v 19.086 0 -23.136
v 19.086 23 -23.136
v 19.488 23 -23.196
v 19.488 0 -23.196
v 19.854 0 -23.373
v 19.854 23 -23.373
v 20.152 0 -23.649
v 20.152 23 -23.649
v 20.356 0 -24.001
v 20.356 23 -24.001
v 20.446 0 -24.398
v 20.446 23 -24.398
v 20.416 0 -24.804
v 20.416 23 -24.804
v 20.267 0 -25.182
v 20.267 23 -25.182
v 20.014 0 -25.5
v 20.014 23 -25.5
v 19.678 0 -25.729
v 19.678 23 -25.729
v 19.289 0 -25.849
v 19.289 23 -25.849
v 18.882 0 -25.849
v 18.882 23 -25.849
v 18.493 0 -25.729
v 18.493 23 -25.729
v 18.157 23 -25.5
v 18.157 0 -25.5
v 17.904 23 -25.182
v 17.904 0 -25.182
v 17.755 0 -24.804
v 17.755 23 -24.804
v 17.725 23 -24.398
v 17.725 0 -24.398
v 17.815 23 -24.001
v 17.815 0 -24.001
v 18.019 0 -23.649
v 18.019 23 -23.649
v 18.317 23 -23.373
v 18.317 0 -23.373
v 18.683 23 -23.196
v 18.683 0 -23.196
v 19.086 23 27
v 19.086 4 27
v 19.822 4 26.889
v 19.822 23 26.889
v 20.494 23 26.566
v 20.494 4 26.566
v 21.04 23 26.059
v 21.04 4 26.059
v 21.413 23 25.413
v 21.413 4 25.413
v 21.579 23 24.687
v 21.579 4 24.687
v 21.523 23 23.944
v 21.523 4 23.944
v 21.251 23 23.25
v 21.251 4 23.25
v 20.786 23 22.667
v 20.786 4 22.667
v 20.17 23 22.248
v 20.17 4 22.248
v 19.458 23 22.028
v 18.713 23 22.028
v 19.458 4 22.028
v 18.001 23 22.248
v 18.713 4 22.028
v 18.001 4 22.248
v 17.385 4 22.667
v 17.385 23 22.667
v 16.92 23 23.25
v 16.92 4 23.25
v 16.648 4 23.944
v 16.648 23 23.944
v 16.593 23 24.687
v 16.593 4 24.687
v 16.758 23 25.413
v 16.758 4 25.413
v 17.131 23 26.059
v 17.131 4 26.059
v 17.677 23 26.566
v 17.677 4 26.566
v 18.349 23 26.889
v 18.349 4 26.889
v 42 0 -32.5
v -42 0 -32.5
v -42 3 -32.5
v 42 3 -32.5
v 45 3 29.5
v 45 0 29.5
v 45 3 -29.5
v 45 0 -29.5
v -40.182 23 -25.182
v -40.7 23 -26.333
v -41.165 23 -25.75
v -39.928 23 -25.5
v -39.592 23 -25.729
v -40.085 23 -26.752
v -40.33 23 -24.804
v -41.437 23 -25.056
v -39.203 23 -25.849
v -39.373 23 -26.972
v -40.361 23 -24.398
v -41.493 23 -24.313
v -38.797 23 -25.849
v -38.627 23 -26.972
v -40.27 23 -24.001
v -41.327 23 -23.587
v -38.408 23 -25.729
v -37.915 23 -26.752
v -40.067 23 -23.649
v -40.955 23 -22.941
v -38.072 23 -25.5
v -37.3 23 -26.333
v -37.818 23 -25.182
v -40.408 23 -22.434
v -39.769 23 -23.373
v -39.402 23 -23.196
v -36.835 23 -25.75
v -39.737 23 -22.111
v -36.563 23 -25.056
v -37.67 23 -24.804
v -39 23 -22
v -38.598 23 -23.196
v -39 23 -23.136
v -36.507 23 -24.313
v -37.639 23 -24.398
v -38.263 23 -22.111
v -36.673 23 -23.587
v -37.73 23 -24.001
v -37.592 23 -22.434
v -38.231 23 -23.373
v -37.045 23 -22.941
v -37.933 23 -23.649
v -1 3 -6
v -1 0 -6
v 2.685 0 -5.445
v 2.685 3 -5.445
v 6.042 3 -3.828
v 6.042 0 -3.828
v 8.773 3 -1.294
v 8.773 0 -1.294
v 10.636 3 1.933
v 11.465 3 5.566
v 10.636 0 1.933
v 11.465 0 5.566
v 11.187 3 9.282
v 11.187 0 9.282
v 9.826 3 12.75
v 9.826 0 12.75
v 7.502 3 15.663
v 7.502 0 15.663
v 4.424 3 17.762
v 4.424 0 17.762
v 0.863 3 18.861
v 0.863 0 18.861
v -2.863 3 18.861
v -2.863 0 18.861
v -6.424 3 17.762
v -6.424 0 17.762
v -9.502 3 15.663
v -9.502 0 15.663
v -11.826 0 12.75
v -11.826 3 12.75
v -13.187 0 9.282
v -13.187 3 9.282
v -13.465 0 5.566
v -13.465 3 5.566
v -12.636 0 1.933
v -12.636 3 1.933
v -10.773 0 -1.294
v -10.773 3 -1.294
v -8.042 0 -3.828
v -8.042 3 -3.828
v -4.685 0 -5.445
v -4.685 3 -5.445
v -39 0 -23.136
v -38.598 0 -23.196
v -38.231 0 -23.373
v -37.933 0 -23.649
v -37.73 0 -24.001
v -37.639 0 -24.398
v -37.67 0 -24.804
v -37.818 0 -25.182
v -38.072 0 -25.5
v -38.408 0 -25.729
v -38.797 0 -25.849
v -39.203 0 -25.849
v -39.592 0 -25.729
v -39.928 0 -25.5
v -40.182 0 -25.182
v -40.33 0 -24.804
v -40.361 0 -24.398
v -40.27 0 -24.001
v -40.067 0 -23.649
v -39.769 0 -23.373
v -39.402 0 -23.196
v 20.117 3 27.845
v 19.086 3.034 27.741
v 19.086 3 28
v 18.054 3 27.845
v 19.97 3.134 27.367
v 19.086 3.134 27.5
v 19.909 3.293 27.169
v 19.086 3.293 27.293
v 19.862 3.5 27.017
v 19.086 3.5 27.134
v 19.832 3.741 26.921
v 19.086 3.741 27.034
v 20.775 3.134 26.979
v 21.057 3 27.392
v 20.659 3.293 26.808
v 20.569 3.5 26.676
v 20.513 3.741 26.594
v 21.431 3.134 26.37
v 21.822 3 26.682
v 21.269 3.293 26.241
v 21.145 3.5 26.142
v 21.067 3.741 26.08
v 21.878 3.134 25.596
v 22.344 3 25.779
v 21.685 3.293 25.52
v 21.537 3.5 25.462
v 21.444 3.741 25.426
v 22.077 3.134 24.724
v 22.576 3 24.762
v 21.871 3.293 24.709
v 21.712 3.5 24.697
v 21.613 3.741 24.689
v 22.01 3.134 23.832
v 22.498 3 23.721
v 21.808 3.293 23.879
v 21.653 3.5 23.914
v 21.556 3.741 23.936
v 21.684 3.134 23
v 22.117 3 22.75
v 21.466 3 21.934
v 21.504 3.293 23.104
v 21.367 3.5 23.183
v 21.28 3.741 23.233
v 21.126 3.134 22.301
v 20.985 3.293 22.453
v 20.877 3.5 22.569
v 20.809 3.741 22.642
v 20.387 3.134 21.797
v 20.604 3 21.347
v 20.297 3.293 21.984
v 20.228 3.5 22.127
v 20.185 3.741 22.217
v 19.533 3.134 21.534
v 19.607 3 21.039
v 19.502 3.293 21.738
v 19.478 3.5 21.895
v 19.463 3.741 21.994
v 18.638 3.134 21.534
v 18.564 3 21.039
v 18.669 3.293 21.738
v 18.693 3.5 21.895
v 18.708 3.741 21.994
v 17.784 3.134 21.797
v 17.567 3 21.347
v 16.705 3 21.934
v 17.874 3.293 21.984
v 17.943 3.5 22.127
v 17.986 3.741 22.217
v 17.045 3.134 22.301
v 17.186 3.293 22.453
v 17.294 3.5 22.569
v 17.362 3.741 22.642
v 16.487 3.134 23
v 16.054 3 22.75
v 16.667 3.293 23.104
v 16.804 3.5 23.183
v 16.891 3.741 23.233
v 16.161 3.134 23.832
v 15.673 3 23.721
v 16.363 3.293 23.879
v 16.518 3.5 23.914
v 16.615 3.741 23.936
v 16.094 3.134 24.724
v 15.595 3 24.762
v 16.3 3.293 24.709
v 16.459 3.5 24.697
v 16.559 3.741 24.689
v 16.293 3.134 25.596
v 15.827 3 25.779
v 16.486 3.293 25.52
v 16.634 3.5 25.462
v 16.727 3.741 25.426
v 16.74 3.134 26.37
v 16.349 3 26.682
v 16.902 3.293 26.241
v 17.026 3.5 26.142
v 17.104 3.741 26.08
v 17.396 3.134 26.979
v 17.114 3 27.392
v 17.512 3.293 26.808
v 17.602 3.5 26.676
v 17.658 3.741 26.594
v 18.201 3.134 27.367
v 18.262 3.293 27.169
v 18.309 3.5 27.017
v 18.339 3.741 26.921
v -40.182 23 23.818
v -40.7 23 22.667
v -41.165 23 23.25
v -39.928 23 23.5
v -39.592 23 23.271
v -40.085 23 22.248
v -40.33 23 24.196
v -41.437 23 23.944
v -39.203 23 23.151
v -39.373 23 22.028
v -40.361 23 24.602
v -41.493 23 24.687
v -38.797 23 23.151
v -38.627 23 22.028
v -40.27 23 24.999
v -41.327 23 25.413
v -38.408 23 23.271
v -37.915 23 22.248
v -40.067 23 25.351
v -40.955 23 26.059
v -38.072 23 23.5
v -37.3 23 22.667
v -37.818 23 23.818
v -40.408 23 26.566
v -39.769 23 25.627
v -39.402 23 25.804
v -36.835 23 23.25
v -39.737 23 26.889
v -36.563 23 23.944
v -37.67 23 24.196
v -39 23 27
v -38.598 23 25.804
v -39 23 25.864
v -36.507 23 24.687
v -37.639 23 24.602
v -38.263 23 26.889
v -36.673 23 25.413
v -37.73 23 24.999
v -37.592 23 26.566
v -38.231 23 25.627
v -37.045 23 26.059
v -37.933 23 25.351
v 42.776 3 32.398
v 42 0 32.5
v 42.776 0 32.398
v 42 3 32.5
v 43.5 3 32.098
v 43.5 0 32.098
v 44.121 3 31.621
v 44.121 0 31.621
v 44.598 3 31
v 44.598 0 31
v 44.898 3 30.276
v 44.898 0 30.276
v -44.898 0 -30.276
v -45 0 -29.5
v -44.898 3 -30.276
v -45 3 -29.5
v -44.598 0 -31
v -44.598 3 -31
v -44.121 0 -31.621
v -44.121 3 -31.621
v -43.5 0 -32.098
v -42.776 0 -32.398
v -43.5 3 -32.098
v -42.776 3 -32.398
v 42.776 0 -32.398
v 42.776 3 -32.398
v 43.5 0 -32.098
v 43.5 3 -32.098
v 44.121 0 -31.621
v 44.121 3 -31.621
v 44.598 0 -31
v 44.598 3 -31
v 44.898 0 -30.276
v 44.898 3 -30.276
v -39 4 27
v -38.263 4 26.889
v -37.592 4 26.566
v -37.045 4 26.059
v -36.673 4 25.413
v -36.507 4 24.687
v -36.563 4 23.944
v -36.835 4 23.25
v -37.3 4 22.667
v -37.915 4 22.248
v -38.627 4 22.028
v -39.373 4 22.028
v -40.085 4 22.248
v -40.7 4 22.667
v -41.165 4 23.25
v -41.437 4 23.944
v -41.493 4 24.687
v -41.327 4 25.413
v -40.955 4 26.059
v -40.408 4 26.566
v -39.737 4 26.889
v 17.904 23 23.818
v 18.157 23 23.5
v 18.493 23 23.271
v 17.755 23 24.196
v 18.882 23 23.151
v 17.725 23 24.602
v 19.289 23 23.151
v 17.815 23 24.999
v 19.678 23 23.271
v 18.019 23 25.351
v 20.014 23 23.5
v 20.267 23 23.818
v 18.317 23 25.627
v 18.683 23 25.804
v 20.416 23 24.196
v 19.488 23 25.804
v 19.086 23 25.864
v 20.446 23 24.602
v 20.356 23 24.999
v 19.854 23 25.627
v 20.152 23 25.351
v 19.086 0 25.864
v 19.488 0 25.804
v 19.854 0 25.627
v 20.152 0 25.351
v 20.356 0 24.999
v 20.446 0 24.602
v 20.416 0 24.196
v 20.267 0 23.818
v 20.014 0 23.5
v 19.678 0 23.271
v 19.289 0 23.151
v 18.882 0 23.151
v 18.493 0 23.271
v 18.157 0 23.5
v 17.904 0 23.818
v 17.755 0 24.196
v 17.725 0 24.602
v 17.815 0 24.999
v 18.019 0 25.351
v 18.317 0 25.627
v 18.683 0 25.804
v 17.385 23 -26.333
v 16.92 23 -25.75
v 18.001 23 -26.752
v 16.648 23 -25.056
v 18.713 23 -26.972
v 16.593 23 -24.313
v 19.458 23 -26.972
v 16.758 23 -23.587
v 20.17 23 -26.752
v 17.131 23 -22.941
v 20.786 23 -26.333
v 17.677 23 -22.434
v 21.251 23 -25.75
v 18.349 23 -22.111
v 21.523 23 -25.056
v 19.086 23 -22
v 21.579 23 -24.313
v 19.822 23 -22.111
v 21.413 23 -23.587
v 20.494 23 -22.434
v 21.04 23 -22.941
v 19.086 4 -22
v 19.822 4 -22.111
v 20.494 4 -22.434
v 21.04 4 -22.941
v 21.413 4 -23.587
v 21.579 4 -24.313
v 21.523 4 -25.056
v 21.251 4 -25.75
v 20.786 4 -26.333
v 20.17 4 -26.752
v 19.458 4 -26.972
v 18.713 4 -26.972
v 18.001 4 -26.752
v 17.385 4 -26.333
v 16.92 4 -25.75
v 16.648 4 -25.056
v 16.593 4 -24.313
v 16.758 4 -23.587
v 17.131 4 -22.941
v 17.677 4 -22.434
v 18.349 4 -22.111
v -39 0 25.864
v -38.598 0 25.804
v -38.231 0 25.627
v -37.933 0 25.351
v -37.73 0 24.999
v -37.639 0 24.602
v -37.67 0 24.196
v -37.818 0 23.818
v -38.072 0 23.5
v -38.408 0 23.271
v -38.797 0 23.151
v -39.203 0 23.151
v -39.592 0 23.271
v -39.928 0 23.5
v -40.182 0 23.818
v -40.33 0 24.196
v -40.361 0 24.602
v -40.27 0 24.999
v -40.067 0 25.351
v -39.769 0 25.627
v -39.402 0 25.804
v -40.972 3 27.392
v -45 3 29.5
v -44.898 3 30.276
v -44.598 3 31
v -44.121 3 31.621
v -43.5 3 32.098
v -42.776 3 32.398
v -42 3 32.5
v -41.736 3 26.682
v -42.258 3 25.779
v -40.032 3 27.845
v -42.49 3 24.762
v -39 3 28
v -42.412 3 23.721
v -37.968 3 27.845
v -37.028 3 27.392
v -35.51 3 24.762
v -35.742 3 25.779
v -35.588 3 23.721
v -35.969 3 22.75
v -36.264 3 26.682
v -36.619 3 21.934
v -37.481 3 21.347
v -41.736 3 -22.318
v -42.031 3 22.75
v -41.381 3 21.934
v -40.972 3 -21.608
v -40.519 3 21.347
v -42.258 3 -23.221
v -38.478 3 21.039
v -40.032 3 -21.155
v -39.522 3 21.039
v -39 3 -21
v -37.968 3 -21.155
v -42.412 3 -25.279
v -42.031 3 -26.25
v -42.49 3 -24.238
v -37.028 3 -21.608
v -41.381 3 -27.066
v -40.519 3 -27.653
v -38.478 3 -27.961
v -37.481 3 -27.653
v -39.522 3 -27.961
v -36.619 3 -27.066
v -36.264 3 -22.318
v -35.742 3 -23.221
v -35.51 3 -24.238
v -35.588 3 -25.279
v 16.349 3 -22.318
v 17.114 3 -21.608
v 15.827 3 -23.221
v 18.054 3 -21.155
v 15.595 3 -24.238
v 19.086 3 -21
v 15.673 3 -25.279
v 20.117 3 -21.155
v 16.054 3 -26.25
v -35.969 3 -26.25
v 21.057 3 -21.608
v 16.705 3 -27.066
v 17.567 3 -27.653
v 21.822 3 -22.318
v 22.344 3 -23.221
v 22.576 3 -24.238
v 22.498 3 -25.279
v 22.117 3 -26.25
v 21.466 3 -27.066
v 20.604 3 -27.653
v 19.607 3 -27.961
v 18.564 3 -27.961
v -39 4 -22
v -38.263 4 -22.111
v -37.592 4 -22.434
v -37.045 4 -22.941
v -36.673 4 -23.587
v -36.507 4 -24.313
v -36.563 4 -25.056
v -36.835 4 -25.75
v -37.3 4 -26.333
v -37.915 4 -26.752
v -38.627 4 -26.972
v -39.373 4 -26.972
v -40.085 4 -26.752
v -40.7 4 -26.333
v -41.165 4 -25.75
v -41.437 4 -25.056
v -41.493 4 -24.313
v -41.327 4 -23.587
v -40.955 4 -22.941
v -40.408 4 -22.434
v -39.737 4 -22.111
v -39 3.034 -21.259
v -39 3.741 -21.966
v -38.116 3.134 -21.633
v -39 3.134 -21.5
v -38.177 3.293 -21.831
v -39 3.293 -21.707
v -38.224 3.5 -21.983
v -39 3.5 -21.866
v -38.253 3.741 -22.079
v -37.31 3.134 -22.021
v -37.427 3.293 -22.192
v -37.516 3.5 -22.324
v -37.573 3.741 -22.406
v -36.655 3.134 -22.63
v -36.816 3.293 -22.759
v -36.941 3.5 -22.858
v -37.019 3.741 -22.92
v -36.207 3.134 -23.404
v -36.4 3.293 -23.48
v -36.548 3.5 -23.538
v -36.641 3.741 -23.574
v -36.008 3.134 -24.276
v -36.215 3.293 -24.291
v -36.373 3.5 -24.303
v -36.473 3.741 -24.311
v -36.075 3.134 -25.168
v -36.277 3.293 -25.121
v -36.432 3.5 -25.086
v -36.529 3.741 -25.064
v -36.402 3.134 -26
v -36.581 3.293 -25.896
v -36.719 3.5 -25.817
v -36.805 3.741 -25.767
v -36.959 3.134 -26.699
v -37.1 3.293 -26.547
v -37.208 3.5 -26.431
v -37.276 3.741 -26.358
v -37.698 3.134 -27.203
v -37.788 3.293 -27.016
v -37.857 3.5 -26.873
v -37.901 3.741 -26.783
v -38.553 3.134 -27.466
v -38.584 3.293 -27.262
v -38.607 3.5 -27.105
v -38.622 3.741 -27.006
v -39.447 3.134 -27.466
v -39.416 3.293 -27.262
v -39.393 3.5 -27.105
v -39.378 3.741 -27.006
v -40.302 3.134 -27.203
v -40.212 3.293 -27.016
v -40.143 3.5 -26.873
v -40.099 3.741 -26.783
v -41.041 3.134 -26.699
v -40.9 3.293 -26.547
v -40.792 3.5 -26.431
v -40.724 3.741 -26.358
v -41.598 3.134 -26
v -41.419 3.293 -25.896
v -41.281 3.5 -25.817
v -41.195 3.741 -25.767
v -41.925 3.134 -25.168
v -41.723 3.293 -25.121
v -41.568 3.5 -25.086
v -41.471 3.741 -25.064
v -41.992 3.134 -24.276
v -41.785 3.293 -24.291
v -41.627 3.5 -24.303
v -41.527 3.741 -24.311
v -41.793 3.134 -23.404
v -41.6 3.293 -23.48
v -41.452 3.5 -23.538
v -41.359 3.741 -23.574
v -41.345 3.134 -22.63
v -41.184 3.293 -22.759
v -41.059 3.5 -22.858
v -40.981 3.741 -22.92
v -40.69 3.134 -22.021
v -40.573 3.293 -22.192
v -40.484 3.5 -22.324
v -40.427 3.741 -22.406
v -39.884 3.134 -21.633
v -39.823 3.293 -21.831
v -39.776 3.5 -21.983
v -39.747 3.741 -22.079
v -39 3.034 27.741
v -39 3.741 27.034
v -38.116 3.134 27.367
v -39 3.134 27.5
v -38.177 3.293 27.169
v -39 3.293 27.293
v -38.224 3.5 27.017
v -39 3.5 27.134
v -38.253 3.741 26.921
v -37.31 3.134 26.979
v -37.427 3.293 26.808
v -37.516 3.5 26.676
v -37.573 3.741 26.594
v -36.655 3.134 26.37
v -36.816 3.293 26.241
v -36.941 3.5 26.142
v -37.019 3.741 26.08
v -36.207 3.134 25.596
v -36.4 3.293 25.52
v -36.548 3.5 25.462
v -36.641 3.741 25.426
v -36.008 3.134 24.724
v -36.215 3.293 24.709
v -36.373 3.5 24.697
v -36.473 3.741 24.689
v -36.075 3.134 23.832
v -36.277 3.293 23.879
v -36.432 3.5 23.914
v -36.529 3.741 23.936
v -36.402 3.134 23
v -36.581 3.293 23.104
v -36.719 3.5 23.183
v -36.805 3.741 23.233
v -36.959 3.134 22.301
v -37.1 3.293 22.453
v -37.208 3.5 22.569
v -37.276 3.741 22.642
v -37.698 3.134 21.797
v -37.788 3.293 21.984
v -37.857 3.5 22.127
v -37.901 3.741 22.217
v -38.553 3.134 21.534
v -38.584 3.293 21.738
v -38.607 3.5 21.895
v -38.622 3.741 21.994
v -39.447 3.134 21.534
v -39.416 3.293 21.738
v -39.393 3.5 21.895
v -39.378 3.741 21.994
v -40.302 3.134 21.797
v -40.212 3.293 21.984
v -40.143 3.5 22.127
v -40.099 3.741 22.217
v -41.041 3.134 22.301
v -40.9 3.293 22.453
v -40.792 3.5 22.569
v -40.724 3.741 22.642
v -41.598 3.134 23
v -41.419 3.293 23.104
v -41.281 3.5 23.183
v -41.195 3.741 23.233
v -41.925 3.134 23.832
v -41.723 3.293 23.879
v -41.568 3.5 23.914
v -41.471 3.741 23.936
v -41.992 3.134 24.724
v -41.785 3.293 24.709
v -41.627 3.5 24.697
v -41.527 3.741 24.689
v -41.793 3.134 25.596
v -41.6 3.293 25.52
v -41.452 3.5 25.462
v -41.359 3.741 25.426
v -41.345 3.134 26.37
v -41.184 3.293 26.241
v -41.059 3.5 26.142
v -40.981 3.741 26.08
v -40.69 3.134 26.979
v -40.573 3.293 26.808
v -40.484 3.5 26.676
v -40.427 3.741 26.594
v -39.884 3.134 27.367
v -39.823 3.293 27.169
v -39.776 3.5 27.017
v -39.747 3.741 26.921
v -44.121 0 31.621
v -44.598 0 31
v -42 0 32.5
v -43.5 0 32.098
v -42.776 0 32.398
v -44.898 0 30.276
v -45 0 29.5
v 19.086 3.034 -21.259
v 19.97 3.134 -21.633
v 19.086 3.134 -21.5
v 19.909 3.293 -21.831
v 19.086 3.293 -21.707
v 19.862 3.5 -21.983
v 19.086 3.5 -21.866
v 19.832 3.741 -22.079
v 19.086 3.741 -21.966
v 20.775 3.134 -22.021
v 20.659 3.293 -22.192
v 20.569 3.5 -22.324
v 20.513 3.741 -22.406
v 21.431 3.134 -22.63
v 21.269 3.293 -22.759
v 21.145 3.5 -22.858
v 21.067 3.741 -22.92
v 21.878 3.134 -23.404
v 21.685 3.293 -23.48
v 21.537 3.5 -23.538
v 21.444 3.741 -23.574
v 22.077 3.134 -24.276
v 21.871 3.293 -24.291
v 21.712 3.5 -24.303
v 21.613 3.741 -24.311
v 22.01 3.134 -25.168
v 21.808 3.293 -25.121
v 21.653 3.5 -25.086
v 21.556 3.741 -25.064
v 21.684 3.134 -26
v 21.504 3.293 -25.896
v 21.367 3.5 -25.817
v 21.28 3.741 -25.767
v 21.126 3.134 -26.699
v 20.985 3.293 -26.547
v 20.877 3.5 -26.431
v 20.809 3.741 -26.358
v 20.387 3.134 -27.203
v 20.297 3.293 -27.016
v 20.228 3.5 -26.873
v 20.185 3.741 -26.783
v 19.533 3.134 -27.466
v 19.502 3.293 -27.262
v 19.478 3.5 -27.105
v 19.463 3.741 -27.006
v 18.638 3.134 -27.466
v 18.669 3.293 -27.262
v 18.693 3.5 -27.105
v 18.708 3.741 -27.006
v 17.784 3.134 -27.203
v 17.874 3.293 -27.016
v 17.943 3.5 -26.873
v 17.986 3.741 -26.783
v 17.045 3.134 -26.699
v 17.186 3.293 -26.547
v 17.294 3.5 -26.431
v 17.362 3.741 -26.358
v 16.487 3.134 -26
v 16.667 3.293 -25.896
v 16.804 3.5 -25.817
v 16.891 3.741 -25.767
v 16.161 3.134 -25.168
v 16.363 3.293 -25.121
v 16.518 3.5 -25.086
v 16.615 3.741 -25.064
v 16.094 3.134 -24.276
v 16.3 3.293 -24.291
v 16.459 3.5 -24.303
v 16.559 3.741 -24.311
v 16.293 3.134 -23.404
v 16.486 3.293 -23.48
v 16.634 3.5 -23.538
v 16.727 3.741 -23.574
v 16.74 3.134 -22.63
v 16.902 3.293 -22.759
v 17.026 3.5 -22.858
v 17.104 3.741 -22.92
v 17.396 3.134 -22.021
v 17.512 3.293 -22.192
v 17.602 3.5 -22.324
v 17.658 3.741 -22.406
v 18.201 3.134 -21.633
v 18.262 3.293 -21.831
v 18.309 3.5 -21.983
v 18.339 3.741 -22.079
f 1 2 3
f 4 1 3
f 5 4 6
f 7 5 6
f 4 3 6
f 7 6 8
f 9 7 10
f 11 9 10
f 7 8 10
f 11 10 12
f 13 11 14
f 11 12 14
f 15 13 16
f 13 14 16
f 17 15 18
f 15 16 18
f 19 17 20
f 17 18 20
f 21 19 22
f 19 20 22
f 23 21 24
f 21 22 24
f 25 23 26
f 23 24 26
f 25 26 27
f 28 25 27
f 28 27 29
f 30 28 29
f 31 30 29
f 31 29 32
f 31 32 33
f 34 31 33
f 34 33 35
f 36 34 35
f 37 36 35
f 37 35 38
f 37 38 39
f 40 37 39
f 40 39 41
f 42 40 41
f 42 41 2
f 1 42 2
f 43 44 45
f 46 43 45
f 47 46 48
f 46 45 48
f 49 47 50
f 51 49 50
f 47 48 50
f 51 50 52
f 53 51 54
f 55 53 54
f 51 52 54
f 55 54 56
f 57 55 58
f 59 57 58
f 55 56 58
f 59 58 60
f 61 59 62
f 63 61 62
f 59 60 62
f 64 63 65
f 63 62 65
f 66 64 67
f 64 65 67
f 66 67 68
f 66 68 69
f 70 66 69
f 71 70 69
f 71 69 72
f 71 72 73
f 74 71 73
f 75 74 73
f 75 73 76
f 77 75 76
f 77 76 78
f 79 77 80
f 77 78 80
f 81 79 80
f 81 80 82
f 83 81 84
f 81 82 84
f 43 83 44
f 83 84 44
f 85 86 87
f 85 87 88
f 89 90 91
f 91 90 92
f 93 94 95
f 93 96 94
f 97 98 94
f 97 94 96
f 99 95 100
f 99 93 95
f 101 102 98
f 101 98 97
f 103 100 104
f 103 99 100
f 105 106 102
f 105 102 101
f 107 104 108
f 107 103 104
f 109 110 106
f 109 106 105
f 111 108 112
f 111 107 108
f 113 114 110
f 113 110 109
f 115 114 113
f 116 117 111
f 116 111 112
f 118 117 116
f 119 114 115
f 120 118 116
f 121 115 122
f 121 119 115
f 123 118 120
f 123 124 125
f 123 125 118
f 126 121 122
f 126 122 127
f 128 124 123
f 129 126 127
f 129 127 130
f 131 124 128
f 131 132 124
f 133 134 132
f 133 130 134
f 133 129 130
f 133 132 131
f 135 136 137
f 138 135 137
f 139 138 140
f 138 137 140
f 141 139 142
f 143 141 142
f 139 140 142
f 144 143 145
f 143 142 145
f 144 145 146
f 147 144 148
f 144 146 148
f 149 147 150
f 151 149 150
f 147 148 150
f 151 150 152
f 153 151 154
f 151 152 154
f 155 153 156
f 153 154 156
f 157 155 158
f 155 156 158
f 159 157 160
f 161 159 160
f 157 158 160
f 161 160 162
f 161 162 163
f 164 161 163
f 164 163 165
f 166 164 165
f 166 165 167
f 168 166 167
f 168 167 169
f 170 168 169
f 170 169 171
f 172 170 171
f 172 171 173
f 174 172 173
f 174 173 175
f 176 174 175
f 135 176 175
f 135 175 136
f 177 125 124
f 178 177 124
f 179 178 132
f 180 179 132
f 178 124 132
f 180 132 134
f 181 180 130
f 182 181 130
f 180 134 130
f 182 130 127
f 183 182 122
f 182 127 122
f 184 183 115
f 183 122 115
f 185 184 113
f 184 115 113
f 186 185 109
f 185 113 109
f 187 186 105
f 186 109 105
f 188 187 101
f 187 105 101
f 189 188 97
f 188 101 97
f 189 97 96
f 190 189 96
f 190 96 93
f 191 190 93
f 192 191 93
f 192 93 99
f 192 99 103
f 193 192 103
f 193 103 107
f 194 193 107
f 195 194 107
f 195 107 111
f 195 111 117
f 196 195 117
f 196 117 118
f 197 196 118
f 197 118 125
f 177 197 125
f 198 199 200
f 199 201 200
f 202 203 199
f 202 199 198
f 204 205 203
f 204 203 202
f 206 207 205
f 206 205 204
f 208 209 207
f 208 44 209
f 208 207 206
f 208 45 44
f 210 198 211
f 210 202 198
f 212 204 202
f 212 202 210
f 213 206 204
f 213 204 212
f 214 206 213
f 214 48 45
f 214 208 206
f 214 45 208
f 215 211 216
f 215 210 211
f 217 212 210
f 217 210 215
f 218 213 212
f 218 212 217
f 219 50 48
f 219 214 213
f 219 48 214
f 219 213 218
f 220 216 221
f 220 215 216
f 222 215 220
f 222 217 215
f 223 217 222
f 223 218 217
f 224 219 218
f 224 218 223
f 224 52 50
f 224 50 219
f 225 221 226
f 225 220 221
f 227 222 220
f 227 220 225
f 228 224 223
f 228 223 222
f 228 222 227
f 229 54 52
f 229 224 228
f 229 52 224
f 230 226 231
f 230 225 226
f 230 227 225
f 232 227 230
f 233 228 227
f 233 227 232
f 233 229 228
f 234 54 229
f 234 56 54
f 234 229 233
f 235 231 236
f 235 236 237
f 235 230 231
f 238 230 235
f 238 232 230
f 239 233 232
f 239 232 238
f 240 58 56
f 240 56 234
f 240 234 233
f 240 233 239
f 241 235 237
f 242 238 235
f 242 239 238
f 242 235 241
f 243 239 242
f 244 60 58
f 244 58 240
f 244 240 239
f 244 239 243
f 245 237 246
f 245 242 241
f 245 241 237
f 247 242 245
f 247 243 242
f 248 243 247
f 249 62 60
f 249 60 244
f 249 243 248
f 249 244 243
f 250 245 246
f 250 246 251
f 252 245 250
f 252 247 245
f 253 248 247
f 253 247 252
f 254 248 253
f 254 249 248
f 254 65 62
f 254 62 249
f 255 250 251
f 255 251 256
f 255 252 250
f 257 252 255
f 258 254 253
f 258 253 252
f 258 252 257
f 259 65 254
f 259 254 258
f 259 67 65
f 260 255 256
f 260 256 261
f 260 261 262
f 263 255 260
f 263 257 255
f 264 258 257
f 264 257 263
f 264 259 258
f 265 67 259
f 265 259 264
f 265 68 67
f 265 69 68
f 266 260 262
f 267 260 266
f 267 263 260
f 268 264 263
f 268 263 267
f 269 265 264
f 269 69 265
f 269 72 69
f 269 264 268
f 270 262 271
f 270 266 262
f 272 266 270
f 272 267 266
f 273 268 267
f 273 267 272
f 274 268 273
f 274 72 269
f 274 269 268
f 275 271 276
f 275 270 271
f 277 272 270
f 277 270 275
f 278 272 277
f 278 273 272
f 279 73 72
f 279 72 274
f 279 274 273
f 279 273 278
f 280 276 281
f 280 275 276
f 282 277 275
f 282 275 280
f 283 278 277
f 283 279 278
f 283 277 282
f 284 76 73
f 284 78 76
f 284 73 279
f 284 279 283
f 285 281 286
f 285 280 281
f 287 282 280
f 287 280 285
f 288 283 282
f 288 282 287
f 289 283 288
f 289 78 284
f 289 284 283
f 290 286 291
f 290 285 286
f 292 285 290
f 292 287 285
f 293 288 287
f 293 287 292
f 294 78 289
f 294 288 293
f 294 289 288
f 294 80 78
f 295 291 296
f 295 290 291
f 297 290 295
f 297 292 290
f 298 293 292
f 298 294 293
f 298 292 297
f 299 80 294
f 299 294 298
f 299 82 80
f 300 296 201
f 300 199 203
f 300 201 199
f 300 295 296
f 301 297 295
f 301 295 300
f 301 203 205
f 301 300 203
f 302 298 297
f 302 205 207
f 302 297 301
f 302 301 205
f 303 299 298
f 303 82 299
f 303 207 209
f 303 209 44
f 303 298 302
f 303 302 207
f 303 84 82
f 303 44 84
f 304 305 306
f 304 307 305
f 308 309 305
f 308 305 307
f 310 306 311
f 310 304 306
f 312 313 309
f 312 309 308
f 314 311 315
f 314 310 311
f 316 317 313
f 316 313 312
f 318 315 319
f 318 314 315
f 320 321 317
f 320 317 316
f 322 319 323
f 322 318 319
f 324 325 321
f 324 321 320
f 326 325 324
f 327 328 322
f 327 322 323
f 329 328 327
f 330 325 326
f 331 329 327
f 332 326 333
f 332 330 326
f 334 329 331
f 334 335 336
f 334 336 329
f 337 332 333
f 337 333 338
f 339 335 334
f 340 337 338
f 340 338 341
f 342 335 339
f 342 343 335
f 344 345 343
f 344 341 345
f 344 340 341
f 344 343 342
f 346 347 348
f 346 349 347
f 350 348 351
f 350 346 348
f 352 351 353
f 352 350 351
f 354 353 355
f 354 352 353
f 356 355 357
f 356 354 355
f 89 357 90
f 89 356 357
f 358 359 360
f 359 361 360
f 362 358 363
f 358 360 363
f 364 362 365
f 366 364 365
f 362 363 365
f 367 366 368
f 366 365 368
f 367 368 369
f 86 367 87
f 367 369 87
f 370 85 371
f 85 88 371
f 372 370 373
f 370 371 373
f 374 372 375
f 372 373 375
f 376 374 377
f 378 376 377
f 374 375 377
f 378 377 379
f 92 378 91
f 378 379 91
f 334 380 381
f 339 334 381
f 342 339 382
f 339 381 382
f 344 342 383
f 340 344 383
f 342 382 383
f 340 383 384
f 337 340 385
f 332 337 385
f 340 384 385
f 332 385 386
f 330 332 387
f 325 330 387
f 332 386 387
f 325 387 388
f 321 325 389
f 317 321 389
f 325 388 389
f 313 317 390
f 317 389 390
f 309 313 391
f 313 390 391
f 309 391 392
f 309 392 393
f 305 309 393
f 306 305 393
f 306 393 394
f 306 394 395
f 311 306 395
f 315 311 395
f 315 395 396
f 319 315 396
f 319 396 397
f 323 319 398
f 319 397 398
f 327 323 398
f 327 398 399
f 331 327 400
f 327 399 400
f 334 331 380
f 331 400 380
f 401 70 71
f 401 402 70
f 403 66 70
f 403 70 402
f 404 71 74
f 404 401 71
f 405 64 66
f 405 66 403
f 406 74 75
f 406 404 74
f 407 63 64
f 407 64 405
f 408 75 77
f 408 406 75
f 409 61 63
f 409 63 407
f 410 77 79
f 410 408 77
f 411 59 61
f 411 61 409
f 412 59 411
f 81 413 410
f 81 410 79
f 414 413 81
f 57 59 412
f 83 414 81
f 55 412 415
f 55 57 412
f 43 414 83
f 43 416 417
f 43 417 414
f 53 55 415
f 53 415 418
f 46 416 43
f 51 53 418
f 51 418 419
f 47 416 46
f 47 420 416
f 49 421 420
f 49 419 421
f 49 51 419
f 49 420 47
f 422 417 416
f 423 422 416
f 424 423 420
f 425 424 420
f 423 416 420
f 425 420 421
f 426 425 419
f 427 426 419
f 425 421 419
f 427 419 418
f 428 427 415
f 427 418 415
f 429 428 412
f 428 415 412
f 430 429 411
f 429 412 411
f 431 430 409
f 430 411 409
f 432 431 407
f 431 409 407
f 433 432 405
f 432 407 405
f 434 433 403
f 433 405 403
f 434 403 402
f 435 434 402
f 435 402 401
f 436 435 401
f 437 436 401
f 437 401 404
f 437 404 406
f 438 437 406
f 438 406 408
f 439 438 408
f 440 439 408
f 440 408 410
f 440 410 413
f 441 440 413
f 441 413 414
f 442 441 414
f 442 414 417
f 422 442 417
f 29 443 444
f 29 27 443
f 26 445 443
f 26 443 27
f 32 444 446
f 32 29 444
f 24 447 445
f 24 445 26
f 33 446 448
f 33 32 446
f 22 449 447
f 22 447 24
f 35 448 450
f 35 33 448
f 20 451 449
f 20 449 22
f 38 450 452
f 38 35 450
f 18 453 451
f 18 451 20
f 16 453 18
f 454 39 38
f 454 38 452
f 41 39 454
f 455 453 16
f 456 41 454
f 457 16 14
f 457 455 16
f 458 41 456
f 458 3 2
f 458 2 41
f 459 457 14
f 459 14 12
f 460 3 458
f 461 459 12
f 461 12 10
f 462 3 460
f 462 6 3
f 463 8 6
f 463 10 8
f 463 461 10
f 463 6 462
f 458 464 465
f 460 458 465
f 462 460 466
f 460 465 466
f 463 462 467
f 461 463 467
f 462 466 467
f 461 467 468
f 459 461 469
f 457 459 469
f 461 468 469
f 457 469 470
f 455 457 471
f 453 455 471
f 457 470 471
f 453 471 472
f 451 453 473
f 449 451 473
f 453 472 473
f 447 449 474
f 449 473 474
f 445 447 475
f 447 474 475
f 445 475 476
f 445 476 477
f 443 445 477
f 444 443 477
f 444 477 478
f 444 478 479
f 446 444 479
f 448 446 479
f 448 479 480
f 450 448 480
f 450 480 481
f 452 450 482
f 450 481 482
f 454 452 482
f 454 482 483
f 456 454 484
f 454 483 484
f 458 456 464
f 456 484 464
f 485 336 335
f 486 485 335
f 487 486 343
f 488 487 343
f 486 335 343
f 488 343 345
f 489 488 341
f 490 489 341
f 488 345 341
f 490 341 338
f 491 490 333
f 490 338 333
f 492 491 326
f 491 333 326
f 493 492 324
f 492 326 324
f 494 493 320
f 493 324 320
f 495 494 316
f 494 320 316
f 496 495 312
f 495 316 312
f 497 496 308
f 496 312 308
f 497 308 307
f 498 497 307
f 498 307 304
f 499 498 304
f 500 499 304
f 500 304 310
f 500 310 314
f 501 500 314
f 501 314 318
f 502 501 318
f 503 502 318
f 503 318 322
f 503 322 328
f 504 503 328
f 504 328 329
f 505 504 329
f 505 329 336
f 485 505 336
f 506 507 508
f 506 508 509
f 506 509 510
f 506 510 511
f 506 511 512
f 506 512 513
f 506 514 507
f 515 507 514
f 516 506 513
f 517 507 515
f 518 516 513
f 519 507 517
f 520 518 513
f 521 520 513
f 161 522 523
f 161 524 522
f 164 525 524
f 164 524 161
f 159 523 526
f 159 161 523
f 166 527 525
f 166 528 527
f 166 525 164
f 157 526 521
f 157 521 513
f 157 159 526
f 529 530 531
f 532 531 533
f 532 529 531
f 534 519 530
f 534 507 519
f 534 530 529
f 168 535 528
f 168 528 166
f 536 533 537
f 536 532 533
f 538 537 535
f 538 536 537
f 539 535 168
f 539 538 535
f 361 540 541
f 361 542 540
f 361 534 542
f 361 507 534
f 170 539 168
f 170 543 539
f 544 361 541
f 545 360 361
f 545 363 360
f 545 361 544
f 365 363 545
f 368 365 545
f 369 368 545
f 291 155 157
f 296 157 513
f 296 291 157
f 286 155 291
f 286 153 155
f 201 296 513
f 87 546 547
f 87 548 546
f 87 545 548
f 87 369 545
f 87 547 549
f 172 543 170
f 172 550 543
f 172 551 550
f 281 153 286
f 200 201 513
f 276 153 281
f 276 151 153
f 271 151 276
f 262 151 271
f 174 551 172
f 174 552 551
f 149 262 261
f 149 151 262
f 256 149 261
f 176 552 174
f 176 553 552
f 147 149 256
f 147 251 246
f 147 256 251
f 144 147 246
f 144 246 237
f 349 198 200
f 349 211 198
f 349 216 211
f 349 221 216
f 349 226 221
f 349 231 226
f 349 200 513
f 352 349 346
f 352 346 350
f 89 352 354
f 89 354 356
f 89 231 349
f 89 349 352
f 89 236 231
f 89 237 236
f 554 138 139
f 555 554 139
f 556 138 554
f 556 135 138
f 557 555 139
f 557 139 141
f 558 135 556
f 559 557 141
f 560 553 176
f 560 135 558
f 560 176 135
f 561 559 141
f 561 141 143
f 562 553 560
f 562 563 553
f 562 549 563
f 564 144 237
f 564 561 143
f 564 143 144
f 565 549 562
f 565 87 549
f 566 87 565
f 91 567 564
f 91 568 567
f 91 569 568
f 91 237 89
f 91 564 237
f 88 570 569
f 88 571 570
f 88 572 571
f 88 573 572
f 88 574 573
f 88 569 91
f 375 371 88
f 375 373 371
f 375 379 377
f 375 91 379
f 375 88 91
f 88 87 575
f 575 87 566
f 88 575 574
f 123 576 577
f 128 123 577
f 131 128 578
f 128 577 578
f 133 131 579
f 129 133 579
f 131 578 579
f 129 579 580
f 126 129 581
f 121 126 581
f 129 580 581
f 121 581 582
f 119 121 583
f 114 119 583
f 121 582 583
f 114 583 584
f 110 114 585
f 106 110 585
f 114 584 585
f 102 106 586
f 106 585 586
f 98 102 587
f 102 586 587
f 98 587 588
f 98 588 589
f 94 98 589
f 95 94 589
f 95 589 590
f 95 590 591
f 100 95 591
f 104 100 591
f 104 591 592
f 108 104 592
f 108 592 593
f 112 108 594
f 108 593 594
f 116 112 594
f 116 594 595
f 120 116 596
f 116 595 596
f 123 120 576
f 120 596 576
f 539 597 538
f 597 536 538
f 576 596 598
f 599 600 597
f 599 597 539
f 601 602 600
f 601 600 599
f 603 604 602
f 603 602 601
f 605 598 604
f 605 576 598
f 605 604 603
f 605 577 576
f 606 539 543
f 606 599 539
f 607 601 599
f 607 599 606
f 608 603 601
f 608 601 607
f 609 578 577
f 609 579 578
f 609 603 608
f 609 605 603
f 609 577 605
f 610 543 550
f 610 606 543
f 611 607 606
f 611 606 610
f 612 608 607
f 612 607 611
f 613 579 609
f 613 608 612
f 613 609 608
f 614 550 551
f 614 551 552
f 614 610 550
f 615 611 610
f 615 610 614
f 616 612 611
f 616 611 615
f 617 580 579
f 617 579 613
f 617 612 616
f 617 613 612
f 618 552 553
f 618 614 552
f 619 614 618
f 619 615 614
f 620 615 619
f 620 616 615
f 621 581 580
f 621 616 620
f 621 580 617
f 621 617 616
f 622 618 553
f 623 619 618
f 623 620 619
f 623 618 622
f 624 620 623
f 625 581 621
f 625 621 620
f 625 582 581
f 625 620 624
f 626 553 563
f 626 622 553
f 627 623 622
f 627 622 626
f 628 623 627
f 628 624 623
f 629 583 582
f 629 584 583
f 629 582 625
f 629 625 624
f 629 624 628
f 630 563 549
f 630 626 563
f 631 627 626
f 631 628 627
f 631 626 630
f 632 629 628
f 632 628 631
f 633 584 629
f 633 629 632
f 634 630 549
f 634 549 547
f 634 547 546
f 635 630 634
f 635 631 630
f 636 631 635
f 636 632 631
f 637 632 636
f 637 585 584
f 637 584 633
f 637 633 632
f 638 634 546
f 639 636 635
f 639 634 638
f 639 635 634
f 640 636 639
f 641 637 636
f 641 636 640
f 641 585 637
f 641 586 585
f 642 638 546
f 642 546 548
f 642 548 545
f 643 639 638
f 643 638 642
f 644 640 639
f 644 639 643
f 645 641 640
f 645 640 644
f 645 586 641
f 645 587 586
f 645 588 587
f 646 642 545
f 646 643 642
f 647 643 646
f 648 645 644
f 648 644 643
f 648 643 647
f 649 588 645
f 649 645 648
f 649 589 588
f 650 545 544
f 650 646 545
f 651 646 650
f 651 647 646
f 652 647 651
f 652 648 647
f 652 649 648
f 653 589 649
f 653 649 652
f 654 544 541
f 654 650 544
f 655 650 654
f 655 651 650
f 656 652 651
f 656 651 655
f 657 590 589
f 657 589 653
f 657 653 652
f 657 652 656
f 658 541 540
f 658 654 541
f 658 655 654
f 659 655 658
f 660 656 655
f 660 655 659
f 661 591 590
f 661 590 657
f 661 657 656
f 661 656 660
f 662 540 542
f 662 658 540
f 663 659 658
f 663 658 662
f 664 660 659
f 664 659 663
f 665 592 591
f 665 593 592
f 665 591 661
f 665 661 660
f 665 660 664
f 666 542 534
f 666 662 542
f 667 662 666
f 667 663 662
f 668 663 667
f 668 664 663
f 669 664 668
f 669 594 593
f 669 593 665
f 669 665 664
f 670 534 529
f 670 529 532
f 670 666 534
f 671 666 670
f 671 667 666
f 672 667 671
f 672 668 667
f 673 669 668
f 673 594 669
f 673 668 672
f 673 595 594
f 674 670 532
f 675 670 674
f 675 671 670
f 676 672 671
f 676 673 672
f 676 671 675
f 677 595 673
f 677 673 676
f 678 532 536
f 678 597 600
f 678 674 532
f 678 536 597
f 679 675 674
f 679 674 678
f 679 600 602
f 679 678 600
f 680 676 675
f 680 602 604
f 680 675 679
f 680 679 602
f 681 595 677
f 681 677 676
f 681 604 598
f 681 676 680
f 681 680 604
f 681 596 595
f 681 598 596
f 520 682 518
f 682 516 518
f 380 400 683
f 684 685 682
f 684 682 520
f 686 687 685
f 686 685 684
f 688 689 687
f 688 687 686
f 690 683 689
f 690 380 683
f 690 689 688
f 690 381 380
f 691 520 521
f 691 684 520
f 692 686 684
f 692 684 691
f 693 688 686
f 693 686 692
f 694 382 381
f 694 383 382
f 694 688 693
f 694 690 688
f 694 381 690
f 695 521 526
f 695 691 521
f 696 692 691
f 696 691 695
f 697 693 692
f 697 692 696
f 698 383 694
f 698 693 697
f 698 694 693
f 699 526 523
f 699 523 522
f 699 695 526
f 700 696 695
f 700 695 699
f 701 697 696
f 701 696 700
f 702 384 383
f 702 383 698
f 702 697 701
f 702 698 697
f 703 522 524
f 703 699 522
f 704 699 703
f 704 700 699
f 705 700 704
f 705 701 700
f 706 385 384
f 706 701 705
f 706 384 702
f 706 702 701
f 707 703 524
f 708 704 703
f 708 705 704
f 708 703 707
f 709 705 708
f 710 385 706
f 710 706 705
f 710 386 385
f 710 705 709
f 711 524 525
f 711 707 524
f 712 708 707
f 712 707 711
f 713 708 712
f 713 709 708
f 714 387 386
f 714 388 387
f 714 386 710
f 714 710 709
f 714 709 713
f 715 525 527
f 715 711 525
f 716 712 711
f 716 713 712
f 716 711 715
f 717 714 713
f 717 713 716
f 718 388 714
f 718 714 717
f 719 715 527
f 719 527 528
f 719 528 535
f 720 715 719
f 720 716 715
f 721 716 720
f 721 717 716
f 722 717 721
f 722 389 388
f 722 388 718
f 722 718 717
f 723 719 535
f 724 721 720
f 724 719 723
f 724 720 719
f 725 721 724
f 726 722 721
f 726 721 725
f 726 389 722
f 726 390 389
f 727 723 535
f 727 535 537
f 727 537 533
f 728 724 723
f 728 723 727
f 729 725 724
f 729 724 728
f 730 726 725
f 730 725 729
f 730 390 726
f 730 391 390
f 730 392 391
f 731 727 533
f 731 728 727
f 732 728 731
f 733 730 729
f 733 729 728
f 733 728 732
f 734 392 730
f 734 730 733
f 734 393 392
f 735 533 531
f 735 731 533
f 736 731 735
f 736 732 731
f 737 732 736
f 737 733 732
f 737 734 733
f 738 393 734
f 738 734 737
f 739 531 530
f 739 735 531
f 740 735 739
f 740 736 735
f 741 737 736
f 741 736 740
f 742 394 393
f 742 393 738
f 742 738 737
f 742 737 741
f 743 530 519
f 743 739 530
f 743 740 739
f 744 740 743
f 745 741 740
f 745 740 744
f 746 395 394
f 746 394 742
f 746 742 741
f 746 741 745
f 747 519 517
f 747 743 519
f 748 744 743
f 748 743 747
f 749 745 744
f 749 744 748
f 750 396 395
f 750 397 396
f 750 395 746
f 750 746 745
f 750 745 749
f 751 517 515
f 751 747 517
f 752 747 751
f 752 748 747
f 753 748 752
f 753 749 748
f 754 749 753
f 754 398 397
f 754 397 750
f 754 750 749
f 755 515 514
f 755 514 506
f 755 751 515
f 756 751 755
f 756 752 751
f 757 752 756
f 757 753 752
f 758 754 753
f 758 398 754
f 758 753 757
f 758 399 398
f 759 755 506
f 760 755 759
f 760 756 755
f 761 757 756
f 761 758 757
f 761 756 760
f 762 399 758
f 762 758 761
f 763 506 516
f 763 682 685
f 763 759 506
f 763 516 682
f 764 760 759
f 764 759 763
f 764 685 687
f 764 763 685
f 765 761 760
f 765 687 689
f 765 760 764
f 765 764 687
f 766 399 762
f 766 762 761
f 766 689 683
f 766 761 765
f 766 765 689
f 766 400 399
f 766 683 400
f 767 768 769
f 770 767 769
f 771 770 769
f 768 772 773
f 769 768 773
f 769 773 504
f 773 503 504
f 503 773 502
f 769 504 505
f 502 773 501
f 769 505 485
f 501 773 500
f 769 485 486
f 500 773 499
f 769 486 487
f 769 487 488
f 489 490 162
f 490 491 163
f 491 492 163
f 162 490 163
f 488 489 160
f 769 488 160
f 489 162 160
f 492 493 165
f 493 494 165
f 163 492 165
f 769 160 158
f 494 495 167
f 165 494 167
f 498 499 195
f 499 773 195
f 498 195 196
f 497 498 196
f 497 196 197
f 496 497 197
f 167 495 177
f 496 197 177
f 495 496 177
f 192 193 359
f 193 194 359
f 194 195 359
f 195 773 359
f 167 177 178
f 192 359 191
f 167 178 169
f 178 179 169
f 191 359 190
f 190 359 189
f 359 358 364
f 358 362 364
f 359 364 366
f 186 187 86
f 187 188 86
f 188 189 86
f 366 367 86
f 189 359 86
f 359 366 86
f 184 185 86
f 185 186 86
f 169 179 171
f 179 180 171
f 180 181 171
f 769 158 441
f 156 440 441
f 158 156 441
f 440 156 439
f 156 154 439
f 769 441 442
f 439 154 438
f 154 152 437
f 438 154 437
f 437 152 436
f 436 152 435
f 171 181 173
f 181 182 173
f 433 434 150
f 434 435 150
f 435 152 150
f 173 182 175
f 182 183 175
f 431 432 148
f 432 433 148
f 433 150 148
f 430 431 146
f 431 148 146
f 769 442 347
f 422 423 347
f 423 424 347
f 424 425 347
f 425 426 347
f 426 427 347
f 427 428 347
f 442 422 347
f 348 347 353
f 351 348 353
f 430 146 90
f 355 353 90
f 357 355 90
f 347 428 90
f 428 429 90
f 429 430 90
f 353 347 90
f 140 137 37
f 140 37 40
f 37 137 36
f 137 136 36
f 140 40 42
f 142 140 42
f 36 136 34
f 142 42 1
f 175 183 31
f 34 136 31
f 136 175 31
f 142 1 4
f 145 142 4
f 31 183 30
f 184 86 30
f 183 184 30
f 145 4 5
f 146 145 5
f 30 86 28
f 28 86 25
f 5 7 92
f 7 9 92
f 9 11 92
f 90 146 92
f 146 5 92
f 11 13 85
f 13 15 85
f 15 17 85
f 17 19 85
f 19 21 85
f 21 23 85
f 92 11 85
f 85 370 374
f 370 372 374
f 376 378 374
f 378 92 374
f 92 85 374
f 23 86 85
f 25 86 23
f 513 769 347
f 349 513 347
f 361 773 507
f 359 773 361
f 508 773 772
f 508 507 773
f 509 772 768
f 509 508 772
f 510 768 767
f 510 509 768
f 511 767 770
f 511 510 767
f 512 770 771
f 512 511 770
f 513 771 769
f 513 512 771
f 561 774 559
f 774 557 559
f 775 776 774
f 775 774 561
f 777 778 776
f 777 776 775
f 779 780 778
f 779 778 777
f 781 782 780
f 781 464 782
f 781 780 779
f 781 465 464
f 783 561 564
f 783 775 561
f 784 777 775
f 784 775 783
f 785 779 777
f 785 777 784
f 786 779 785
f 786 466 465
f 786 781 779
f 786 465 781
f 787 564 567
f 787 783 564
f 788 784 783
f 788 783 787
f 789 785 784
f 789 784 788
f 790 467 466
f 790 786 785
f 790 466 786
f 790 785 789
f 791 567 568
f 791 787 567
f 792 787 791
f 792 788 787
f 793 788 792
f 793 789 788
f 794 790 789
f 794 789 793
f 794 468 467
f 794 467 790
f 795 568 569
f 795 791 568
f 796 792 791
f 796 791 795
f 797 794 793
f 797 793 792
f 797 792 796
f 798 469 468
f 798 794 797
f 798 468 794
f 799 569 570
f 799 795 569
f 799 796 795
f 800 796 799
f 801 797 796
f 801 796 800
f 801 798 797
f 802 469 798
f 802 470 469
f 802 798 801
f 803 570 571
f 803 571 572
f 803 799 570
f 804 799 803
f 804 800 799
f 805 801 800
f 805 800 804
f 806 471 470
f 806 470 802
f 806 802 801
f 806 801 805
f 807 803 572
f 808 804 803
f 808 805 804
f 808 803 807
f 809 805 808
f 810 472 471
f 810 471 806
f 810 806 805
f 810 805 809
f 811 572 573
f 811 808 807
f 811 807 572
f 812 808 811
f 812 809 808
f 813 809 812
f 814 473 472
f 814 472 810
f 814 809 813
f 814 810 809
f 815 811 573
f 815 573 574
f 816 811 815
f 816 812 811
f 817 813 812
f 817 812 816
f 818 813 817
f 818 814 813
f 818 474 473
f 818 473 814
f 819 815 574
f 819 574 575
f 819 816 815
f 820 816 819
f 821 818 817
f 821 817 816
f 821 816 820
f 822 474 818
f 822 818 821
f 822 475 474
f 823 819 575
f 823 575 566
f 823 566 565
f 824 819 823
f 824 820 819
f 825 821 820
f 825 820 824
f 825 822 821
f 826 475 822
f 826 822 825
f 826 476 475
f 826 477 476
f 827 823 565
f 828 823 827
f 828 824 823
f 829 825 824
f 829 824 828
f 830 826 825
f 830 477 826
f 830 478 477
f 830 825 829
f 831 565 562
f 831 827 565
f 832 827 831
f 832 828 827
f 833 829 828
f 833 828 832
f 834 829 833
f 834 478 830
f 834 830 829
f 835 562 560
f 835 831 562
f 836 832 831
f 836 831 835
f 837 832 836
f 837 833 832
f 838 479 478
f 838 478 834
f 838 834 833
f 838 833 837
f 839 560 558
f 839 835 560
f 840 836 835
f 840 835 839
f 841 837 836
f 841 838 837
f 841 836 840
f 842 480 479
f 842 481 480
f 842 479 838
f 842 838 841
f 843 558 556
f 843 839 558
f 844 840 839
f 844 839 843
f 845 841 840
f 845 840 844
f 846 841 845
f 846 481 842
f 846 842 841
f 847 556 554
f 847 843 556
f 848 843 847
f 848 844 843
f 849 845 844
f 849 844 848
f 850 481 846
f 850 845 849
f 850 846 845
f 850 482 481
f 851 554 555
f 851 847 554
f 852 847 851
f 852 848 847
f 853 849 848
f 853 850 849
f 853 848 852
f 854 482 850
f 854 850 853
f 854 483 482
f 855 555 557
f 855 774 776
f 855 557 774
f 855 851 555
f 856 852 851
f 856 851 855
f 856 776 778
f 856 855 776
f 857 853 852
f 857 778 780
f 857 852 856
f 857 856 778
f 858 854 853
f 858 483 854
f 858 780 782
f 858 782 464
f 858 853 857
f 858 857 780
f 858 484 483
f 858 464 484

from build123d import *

# Parameters (mm, degrees)
SKIZZE1_W                       = 90
SKIZZE1_H                       = 65
AUFSATZ_LINEAR_AUSTRAGEN1_DEPTH = 3
SKIZZE3_R                       = 2.5
AUFSATZ_LINEAR_AUSTRAGEN2_DEPTH = 20
SKIZZE4_R                       = 1.364499713
SCHNITT_LINEAR_AUSTRAGEN2_DEPTH = 61.085355953
VERRUNDUNG1_R                   = 3
VERRUNDUNG2_R                   = 1
SKIZZE5_R                       = 12.500347999
SCHNITT_LINEAR_AUSTRAGEN3_DEPTH = 61.085355953


with BuildPart() as part:
    # Skizze1 → Aufsatz-Linear austragen1 (new body)
    with BuildSketch(Plane(origin=(0, 0, 0), x_dir=(1, 0, 0), z_dir=(0, 1, 0))):
        Rectangle(SKIZZE1_W, SKIZZE1_H)
    extrude(amount=AUFSATZ_LINEAR_AUSTRAGEN1_DEPTH)

    # Skizze3 → Aufsatz-Linear austragen2 (add)
    with BuildSketch(Plane(origin=(0, 3, 0), x_dir=(1, 0, 0), z_dir=(0, 1, 0))):
        with Locations(Location((-39, 24.5, 0), (0, 0, 270))):
            Circle(SKIZZE3_R)
        with Locations(Location((19.085512482, 24.5, 0), (0, 0, 270))):
            Circle(SKIZZE3_R)
        with Locations(Location((19.085512482, -24.5, 0), (0, 0, 270))):
            Circle(SKIZZE3_R)
        with Locations(Location((-39, -24.5, 0), (0, 0, 270))):
            Circle(SKIZZE3_R)
    extrude(amount=AUFSATZ_LINEAR_AUSTRAGEN2_DEPTH)

    # Skizze4 → Schnitt-Linear austragen2 (cut, through all)
    with BuildSketch(Plane(origin=(0, 23, 0), x_dir=(1, 0, 0), z_dir=(0, 1, 0))):
        with Locations(Location((19.085512482, 24.5, 0), (0, 0, 270))):
            Circle(SKIZZE4_R)
        with Locations(Location((-39, 24.5, 0), (0, 0, 270))):
            Circle(SKIZZE4_R)
        with Locations(Location((-39, -24.5, 0), (0, 0, 270))):
            Circle(SKIZZE4_R)
        with Locations(Location((19.085512482, -24.5, 0), (0, 0, 270))):
            Circle(SKIZZE4_R)
    extrude(amount=-SCHNITT_LINEAR_AUSTRAGEN2_DEPTH, mode=Mode.SUBTRACT)

    # Verrundung1
    verrundung1_edges = [part.edges().sort_by_distance(p)[0] for p in [
        (-45, 1.5, 32.5),
        (-45, 1.5, -32.5),
        (45, 1.5, -32.5),
        (45, 1.5, 32.5),
    ]]
    fillet(verrundung1_edges, radius=VERRUNDUNG1_R)

    # Verrundung2
    verrundung2_edges = [part.edges().sort_by_distance(p)[0] for p in [
        (-39, 3, -27),
        (19.085512482, 3, -27),
        (19.085512482, 3, 22),
        (-39, 3, 22),
    ]]
    fillet(verrundung2_edges, radius=VERRUNDUNG2_R)

    # Skizze5 → Schnitt-Linear austragen3 (cut, through all)
    with BuildSketch(Plane.XZ):
        with Locations(Location((-1, 6.5, 0), (0, 0, 270))):
            Circle(SKIZZE5_R)
    extrude(amount=-SCHNITT_LINEAR_AUSTRAGEN3_DEPTH, mode=Mode.SUBTRACT)


solid = part.part
